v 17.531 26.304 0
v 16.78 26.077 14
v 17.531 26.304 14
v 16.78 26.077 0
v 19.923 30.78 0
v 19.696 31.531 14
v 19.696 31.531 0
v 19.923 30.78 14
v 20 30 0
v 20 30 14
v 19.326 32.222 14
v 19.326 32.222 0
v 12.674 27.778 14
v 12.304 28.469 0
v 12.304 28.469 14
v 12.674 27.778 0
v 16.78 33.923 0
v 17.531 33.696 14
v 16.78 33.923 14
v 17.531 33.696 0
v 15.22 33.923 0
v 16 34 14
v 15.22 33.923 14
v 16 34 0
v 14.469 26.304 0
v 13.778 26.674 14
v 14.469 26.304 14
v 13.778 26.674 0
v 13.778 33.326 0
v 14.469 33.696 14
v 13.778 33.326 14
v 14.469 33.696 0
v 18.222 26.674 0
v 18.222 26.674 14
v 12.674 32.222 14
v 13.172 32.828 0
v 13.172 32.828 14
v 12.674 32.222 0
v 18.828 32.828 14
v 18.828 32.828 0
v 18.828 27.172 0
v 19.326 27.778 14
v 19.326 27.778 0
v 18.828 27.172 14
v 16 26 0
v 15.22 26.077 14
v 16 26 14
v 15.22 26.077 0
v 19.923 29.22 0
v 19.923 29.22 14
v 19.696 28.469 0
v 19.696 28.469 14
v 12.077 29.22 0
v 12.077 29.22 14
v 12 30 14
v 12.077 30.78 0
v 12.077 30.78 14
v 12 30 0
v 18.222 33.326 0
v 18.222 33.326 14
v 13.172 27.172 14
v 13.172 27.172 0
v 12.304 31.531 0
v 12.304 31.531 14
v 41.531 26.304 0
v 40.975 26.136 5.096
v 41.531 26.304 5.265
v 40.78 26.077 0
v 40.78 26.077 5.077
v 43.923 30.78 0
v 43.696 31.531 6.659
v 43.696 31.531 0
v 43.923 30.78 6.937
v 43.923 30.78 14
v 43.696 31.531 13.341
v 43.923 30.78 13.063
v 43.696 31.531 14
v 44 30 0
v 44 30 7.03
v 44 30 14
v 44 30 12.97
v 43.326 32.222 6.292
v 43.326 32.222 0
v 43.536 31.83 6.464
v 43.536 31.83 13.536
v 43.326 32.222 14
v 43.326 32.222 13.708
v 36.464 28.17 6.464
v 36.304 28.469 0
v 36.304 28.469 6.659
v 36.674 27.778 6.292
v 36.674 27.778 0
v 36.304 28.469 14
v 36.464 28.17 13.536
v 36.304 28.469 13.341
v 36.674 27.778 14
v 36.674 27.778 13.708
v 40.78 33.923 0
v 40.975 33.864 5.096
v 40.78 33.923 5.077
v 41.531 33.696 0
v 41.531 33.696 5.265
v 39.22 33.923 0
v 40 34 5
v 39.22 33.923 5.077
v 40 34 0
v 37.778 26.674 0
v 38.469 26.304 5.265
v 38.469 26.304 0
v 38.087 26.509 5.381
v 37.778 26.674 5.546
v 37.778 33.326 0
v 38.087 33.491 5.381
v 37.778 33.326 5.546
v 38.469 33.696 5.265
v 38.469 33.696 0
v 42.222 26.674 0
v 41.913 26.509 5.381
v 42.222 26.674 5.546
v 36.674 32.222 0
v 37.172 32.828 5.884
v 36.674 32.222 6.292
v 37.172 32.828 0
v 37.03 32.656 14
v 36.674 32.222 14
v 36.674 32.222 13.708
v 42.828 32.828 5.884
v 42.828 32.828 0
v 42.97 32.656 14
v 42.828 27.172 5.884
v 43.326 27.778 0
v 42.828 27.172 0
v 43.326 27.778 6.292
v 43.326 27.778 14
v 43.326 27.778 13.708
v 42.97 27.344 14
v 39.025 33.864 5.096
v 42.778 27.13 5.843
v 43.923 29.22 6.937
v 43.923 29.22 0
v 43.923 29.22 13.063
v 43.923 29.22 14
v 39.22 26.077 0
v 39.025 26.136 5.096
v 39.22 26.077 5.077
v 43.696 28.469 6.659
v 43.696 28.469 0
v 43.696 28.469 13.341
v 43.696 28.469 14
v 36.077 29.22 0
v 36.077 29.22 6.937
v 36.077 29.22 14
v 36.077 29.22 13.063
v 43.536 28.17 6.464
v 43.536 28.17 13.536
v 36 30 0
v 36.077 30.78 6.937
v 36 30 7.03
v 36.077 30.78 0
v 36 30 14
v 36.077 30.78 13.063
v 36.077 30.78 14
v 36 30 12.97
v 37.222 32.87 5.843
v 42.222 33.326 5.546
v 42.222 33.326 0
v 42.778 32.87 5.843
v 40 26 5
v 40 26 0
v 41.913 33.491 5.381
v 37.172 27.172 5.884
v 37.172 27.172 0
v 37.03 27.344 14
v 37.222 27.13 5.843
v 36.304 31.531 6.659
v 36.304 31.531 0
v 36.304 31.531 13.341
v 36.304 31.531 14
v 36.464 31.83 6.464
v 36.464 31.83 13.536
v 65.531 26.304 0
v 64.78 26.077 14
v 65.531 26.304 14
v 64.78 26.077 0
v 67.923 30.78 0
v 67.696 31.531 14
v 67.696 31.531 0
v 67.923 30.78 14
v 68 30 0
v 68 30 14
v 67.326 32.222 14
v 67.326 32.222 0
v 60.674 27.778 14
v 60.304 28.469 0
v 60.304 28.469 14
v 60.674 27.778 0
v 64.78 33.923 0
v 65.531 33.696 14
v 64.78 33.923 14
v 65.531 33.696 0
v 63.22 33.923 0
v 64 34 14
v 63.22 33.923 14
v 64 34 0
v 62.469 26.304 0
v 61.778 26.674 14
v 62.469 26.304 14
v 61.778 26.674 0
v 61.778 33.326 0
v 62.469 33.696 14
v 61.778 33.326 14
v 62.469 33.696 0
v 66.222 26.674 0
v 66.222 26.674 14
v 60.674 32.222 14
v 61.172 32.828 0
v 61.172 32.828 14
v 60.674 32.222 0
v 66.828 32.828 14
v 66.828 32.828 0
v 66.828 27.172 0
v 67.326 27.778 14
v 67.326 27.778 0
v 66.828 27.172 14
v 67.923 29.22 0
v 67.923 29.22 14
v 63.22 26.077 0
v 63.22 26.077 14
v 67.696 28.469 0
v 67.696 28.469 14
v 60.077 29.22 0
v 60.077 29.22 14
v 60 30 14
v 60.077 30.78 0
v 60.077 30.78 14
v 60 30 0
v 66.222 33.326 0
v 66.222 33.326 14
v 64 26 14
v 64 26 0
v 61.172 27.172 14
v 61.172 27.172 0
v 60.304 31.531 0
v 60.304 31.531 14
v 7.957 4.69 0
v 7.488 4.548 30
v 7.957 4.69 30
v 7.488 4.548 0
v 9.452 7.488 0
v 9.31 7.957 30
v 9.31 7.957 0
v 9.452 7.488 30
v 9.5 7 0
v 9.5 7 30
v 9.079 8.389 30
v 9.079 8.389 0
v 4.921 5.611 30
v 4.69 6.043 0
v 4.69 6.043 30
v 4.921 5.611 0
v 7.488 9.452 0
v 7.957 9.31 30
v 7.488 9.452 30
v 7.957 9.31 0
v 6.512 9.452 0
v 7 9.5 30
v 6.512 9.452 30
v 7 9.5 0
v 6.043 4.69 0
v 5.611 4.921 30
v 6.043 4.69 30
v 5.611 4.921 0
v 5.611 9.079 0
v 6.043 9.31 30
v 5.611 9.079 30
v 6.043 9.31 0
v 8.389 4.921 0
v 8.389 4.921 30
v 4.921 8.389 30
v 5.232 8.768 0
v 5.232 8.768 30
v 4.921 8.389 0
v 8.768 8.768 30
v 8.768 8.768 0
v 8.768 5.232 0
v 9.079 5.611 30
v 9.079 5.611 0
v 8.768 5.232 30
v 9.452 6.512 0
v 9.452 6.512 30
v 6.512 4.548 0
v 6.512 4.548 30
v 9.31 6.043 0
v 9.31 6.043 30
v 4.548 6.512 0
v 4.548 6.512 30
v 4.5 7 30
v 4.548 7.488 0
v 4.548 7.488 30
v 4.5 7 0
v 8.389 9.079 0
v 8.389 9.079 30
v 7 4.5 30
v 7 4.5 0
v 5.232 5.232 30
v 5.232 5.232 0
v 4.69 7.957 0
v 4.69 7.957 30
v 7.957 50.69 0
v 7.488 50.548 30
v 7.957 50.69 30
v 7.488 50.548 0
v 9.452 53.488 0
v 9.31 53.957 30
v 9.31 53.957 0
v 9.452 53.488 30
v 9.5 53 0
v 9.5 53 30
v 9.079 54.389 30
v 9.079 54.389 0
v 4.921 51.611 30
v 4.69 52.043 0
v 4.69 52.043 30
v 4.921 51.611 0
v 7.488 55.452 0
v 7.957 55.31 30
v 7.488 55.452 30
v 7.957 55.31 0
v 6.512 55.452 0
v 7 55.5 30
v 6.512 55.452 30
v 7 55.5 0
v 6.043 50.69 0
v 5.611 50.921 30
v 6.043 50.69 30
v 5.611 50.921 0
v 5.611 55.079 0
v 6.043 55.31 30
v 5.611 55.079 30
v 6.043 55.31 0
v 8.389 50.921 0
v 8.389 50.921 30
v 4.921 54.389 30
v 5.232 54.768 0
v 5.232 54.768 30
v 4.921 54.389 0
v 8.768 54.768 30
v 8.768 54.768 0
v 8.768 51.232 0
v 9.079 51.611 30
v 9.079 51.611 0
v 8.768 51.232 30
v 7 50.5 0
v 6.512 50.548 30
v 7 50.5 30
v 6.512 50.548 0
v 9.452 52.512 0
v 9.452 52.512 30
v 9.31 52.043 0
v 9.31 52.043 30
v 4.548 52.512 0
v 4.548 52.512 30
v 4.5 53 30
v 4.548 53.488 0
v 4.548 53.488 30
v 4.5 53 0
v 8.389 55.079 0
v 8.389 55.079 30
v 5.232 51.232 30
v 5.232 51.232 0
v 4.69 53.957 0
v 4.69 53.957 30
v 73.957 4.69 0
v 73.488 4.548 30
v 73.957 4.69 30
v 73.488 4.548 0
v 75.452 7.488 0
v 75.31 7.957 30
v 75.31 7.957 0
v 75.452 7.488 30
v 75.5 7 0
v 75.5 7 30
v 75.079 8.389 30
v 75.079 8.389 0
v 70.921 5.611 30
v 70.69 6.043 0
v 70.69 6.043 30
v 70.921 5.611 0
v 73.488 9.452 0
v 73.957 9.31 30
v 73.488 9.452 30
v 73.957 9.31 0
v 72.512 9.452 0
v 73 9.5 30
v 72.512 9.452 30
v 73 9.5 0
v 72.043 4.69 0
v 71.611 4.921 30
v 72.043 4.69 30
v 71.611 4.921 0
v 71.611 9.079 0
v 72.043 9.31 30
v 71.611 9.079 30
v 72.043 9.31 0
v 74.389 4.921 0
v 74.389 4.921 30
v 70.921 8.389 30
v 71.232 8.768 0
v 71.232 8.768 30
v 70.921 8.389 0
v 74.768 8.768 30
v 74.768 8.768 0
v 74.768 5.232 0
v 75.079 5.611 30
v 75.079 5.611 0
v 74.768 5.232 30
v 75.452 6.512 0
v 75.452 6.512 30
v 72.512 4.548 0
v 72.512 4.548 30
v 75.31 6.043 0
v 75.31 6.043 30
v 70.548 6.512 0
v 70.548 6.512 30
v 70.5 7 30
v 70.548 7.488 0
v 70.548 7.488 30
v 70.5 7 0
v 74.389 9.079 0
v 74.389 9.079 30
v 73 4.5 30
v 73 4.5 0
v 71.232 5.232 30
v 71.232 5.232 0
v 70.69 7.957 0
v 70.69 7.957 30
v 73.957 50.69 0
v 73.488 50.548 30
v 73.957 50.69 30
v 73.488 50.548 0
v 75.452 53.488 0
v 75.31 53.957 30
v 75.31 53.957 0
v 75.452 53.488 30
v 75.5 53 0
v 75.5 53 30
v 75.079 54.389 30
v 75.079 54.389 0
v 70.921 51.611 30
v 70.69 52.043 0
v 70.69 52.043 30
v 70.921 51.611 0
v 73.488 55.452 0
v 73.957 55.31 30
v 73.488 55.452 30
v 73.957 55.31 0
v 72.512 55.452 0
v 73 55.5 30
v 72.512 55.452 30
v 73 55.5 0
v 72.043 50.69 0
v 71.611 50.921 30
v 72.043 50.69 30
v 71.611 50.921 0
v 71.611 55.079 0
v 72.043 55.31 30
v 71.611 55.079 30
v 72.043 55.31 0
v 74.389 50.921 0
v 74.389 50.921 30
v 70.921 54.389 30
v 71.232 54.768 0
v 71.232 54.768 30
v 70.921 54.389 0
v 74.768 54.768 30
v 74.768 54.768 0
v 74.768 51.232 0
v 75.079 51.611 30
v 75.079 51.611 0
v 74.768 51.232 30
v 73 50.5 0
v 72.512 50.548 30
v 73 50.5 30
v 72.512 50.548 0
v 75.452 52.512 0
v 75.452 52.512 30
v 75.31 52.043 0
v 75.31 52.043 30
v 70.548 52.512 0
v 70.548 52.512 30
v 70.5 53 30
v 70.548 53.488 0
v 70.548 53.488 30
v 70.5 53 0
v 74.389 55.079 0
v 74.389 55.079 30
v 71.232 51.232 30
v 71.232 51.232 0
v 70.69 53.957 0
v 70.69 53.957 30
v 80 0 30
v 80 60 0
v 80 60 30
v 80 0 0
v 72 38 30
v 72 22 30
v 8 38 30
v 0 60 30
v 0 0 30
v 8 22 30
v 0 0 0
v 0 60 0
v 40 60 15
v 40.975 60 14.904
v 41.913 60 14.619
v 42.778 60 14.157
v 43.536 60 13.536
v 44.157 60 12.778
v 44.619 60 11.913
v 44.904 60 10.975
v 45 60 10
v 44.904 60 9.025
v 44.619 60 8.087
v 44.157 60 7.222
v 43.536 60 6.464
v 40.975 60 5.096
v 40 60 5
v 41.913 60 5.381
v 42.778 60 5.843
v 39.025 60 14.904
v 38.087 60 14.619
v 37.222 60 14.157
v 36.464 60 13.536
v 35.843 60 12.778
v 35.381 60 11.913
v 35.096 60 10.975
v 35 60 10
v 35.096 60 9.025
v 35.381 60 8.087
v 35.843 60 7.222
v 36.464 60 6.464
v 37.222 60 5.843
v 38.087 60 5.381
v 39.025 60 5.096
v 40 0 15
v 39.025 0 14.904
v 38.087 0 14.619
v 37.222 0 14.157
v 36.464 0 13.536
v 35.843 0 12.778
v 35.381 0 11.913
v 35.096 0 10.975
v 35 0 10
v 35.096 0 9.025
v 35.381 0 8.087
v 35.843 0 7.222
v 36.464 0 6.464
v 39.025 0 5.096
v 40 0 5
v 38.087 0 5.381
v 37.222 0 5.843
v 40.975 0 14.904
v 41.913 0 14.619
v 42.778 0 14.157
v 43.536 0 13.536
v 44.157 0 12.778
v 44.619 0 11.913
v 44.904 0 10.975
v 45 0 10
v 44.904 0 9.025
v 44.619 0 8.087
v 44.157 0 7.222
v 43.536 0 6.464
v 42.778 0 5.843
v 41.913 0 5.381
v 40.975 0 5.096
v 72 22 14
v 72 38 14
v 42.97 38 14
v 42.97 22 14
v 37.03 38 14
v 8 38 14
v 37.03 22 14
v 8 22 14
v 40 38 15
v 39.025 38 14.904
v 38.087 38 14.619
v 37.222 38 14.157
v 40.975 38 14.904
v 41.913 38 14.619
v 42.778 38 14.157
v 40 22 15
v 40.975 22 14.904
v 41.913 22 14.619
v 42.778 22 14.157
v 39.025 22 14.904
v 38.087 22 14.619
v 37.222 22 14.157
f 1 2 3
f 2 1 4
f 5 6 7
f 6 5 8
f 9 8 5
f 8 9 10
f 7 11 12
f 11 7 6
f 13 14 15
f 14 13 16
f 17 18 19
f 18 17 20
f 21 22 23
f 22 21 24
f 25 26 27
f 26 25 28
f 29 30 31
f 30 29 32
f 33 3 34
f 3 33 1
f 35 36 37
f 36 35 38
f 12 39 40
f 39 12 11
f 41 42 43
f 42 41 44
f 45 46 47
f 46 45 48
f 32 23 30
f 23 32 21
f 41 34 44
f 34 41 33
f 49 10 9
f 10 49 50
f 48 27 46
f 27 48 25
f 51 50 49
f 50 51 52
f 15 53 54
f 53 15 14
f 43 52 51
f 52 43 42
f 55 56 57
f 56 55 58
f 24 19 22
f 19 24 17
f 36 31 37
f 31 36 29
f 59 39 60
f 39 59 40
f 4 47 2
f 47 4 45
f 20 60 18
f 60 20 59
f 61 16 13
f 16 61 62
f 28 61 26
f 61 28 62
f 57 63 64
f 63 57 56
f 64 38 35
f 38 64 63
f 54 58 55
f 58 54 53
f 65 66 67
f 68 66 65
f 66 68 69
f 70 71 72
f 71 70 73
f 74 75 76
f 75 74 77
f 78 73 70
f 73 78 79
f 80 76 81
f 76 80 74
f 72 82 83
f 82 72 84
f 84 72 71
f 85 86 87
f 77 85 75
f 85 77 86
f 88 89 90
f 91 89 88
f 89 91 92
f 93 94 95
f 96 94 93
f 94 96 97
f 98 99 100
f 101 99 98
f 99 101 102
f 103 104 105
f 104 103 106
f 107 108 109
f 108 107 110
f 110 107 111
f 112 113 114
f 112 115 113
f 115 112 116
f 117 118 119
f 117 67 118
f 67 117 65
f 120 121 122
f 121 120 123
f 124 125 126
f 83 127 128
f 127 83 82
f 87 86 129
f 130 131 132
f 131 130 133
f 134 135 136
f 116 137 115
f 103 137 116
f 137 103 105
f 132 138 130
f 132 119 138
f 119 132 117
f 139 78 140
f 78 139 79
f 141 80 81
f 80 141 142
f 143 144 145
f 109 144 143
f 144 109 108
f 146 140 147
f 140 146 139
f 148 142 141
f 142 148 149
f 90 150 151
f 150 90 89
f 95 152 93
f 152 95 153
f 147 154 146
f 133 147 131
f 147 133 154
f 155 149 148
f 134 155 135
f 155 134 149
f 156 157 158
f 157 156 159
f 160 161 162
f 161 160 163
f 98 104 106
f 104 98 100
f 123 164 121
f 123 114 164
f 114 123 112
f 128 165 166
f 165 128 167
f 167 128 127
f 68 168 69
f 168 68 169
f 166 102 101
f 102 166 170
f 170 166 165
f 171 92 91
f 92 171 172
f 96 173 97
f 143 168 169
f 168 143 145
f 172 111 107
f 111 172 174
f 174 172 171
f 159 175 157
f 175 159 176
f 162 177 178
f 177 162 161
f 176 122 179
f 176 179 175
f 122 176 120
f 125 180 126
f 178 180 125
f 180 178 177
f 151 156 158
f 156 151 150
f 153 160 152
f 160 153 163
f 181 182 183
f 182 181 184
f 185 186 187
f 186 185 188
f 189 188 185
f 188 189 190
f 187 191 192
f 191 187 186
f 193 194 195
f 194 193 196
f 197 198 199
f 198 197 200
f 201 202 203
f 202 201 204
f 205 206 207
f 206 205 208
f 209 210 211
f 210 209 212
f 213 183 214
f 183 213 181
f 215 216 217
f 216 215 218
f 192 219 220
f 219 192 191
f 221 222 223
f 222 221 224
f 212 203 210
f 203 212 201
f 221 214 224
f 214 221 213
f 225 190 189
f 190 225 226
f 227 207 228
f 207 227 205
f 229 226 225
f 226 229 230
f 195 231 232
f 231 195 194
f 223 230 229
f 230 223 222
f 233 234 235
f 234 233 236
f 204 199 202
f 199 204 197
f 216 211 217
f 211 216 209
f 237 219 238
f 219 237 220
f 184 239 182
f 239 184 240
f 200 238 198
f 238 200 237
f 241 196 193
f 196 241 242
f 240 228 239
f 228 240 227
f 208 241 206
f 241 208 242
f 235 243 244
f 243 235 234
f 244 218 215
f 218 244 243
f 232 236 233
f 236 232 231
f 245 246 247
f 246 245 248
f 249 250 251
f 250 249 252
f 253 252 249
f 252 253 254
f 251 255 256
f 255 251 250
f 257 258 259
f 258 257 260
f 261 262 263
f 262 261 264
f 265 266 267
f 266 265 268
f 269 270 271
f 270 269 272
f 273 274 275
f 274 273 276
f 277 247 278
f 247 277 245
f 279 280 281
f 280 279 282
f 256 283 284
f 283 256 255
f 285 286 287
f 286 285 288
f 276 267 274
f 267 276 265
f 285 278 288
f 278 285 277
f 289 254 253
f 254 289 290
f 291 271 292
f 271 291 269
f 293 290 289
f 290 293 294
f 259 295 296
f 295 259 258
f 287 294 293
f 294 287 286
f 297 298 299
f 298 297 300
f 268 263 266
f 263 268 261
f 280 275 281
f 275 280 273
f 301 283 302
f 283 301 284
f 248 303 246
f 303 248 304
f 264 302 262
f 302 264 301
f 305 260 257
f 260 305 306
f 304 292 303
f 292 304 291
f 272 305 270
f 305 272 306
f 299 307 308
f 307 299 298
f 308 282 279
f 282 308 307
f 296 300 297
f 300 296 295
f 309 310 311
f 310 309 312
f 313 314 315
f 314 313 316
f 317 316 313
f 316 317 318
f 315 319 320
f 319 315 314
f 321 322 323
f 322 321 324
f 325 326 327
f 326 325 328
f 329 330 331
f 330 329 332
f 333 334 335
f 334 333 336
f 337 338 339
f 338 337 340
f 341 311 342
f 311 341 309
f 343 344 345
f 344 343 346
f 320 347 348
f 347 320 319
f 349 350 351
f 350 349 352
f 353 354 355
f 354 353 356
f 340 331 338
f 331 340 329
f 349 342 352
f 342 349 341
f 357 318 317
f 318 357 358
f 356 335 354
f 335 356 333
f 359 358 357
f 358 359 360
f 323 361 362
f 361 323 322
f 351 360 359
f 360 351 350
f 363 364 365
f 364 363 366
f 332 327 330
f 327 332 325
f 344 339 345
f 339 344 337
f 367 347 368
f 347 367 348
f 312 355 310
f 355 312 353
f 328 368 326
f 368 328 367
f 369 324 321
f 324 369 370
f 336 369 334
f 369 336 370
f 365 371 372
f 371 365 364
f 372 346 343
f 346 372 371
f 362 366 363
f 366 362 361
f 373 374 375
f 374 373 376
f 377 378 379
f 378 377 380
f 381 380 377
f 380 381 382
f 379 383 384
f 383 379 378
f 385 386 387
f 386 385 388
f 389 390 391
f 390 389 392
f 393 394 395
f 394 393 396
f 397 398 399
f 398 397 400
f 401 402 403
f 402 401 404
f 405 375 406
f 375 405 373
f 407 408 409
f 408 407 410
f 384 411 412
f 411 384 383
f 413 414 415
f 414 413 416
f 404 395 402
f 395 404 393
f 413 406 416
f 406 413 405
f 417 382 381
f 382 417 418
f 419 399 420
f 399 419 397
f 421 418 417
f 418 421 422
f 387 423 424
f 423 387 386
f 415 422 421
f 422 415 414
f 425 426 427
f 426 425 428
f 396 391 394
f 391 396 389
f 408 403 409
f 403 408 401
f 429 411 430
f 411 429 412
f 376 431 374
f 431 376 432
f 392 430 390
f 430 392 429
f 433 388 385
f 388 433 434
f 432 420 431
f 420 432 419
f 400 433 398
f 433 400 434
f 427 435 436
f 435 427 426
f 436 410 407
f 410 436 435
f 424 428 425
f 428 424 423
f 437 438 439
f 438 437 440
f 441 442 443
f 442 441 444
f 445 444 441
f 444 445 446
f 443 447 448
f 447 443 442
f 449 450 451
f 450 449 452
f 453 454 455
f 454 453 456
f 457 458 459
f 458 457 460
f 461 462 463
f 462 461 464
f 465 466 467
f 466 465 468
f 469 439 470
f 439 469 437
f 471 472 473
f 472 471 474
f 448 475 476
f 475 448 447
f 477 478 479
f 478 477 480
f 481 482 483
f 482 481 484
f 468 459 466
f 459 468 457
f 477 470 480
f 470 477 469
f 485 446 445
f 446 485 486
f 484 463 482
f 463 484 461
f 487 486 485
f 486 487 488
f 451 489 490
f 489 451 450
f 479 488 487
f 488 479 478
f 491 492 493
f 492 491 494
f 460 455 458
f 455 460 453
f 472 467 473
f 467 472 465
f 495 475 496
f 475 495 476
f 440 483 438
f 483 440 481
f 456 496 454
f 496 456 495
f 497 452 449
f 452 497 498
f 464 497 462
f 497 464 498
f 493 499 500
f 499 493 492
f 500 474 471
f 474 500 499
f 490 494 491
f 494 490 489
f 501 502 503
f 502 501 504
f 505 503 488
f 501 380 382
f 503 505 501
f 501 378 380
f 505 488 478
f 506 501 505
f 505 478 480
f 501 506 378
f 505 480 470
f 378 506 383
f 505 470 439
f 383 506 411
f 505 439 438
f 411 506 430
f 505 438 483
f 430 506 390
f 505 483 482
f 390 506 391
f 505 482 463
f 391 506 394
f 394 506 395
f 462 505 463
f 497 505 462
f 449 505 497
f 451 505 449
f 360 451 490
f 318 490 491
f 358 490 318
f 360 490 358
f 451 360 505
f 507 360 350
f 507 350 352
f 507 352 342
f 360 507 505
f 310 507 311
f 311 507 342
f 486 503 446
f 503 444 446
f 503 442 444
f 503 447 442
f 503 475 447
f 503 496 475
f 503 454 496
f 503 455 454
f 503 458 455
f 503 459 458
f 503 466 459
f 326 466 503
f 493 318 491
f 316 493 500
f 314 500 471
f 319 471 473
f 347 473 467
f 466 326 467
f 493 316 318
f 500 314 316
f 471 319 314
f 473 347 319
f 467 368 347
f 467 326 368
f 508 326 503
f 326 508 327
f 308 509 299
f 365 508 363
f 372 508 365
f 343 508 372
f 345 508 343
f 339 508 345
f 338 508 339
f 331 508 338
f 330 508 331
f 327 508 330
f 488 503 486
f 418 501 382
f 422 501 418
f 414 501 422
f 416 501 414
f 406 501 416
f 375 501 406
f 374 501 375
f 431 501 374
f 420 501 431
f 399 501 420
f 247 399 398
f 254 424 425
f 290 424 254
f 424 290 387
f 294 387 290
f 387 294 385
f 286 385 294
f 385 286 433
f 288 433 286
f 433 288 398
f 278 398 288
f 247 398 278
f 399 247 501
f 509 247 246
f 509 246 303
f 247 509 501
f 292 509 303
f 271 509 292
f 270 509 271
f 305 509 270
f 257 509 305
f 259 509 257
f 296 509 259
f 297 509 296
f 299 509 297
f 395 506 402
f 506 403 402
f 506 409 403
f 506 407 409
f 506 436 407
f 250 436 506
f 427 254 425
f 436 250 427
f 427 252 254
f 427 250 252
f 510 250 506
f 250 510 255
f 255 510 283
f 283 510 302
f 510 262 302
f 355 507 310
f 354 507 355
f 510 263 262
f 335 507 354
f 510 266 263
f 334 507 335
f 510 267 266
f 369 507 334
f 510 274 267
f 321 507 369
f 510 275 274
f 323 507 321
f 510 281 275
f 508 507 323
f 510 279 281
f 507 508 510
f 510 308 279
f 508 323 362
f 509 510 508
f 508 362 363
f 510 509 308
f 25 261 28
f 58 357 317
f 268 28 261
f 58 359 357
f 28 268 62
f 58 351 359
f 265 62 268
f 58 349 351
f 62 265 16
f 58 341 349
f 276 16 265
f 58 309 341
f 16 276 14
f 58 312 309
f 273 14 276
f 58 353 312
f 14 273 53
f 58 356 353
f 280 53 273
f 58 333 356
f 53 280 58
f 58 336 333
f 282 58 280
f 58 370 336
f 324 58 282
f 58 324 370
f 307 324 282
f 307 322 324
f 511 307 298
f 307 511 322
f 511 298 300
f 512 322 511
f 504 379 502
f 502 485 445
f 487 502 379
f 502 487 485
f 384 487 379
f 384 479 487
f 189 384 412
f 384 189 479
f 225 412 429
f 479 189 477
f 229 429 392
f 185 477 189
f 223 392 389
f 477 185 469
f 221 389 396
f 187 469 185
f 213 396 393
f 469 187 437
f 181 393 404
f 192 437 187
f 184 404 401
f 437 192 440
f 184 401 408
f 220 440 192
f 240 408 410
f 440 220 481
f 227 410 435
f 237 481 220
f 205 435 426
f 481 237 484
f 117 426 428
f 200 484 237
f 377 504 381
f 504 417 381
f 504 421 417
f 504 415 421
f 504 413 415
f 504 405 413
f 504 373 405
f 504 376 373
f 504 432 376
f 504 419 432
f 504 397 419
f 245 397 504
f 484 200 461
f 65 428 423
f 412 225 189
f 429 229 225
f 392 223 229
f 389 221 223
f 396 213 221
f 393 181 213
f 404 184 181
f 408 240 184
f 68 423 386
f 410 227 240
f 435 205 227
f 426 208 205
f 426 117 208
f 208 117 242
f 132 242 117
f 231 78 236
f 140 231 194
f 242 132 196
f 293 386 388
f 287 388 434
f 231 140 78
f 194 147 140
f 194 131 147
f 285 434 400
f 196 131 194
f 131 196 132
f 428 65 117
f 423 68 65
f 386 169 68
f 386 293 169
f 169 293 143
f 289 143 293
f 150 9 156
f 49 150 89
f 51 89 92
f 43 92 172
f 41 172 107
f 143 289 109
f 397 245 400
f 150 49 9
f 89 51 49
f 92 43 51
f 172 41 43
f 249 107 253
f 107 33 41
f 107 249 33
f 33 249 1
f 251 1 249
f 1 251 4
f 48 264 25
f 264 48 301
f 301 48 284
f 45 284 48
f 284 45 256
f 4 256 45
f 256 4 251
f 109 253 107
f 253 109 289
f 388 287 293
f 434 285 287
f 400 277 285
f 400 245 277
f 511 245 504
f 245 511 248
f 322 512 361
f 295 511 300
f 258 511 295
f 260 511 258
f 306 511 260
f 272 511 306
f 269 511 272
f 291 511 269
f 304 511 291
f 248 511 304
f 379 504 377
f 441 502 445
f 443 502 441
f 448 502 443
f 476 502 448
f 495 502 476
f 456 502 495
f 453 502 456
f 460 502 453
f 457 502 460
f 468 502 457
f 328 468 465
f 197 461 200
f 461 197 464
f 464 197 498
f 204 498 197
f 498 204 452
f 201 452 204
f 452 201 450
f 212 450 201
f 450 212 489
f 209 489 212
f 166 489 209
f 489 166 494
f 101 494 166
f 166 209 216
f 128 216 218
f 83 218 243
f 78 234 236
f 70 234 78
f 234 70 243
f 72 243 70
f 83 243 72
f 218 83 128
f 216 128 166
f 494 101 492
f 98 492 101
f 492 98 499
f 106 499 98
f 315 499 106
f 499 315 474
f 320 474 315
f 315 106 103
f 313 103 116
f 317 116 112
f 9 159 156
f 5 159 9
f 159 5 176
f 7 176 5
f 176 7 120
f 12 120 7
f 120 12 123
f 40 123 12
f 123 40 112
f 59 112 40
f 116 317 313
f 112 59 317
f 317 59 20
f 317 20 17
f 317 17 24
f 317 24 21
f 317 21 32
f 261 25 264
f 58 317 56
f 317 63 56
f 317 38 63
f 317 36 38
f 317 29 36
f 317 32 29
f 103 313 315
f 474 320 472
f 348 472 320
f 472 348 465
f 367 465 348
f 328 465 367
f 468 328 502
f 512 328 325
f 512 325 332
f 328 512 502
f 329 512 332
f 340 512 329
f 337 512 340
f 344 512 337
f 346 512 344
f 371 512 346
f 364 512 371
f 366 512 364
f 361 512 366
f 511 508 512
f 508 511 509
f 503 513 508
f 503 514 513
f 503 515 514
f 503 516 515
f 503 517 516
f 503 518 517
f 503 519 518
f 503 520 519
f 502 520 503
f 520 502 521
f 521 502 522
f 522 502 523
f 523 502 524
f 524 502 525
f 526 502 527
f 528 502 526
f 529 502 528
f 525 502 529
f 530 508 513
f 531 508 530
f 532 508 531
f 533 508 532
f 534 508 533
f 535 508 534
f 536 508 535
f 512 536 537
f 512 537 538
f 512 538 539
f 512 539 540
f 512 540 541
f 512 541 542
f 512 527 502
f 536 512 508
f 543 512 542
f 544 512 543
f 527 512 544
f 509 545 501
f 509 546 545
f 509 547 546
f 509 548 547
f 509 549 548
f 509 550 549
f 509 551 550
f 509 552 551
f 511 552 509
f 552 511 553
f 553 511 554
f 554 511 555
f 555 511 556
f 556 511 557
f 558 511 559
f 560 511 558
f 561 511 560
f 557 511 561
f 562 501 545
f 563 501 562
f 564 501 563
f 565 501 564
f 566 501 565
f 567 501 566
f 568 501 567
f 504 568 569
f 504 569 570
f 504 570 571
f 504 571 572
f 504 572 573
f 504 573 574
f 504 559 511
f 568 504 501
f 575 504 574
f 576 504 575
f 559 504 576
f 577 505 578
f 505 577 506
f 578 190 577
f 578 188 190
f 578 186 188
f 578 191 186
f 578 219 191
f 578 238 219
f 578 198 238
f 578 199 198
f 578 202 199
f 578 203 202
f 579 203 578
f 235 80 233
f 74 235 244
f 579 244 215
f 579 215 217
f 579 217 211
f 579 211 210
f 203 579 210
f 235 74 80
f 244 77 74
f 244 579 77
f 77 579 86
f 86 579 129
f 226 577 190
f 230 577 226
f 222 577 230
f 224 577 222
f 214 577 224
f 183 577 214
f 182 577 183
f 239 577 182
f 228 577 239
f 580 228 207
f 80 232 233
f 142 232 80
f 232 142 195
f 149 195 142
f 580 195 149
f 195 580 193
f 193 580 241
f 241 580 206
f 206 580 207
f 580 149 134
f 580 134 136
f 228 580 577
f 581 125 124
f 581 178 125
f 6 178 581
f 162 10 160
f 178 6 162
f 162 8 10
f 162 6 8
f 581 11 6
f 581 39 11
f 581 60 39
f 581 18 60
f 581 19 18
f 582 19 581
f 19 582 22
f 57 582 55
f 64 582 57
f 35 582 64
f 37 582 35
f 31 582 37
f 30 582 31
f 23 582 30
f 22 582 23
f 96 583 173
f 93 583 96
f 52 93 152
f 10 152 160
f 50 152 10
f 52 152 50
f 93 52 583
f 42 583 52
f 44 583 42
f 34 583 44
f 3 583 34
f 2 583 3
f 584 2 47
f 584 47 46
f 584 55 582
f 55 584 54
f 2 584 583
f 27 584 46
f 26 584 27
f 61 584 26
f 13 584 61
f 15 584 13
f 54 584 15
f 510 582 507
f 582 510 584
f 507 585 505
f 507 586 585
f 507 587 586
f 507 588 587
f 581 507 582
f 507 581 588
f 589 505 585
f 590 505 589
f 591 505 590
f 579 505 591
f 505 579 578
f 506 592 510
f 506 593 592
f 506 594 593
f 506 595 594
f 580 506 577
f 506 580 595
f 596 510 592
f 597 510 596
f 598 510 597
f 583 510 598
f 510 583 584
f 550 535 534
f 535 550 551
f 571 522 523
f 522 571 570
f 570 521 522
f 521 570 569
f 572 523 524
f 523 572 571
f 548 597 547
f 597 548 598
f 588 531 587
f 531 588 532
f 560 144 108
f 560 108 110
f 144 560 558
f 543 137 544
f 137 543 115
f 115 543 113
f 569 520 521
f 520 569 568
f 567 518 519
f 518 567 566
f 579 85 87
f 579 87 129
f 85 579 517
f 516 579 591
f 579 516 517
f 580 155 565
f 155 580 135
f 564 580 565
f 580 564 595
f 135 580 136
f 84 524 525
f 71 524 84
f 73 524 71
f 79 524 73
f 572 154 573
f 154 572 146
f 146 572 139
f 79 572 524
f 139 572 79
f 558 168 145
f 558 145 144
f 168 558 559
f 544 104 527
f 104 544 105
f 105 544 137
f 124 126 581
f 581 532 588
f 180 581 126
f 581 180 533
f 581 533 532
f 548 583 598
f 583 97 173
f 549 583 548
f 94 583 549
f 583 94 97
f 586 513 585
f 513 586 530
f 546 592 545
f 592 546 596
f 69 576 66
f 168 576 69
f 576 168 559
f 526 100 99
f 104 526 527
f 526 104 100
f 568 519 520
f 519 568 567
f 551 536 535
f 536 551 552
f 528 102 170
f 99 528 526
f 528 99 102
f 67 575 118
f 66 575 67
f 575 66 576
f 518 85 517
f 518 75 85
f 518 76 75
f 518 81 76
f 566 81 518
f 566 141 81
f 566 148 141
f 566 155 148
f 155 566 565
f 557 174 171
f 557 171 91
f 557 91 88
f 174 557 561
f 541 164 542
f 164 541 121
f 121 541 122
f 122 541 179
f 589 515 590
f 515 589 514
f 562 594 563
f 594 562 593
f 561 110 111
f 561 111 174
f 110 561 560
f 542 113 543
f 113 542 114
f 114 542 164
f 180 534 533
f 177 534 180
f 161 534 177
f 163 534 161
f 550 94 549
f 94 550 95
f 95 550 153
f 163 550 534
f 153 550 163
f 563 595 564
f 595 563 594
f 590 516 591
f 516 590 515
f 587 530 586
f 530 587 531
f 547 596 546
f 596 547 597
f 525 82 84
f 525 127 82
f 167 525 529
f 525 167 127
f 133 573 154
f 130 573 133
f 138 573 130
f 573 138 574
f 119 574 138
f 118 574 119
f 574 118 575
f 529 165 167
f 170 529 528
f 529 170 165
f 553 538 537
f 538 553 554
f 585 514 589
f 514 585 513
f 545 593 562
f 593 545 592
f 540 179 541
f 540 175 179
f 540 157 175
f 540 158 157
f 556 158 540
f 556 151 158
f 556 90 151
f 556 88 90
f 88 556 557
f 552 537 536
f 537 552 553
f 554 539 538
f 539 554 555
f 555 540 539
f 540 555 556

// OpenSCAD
$fn = 32;

// ----------------------------------------------------------------------
// Manifold block: side_outlet manifold
// ----------------------------------------------------------------------

// --- parameters (mm) ---
block_l = 80;             // block length, X
block_w = 60;             // block width, Y
block_h = 30;             // block height, Z
port_d = 8;               // port bore diameter
port_pitch = 24;          // port pitch along X
gallery_d = 16;           // top gallery width, Y
gallery_depth = 16;       // gallery pocket depth
wall_p = 8;               // gallery end wall thickness, X
mnt_d = 5;                // mounting hole diameter
mnt_in = 7;               // mounting hole inset from the edges
out_d = 10;               // outlet bore diameter
out_z = 10;               // outlet axis height

n_ports = 3;  // ports in the row
port_x0 = (block_l - (n_ports - 1) * port_pitch) / 2;  // first port X

difference() {
  cube([block_l, block_w, block_h]);
  for (i = [0 : n_ports - 1])
    translate([port_x0 + i * port_pitch, block_w / 2, -1])
      cylinder(h = block_h + 2, d = port_d);
  translate([wall_p, block_w / 2 - gallery_d / 2, block_h - gallery_depth])
    cube([block_l - 2 * wall_p, gallery_d, gallery_depth + 1]);
  for (cx = [mnt_in, block_l - mnt_in])
    for (cy = [mnt_in, block_w - mnt_in])
      translate([cx, cy, -1]) cylinder(h = block_h + 2, d = mnt_d);
  translate([block_l / 2, -1, out_z]) rotate([-90, 0, 0])
    cylinder(h = block_w + 2, d = out_d);
}
